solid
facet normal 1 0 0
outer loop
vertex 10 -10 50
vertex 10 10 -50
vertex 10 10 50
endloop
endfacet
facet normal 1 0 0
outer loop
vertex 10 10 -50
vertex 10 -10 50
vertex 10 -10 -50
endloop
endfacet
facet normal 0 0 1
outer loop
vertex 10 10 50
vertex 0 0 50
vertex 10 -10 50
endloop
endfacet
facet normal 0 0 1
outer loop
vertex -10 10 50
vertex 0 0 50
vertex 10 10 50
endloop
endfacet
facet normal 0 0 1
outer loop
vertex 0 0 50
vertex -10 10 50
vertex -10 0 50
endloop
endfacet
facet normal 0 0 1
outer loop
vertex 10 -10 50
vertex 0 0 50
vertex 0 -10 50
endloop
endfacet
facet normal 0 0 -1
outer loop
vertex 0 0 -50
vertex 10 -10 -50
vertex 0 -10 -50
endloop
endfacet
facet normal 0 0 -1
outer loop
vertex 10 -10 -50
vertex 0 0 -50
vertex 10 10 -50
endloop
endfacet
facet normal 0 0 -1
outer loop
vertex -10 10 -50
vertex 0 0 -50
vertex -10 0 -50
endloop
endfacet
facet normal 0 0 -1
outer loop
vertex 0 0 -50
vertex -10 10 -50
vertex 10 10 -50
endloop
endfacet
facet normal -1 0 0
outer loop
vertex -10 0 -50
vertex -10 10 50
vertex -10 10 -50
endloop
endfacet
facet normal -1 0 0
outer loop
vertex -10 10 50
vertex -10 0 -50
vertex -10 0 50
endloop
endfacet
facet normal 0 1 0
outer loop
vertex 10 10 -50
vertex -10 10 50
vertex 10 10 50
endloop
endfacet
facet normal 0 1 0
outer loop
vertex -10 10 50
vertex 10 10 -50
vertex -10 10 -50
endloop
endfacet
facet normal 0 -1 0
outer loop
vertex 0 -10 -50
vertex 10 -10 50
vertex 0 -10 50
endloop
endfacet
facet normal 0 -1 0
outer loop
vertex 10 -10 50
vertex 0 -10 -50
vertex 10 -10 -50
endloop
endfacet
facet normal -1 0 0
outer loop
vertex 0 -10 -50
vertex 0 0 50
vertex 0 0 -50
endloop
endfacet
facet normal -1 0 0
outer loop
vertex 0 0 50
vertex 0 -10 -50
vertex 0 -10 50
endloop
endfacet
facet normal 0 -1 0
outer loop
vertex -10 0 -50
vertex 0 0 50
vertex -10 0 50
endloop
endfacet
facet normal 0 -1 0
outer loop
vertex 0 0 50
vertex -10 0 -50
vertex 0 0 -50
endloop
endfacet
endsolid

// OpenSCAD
module aluminium_extrusion() {
    difference() {
        cube([20, 20, 100], center = true);
        translate([-8, -8, -1])
            cube([16, 16, 102], center = true);
    }
}

aluminium_extrusion();
